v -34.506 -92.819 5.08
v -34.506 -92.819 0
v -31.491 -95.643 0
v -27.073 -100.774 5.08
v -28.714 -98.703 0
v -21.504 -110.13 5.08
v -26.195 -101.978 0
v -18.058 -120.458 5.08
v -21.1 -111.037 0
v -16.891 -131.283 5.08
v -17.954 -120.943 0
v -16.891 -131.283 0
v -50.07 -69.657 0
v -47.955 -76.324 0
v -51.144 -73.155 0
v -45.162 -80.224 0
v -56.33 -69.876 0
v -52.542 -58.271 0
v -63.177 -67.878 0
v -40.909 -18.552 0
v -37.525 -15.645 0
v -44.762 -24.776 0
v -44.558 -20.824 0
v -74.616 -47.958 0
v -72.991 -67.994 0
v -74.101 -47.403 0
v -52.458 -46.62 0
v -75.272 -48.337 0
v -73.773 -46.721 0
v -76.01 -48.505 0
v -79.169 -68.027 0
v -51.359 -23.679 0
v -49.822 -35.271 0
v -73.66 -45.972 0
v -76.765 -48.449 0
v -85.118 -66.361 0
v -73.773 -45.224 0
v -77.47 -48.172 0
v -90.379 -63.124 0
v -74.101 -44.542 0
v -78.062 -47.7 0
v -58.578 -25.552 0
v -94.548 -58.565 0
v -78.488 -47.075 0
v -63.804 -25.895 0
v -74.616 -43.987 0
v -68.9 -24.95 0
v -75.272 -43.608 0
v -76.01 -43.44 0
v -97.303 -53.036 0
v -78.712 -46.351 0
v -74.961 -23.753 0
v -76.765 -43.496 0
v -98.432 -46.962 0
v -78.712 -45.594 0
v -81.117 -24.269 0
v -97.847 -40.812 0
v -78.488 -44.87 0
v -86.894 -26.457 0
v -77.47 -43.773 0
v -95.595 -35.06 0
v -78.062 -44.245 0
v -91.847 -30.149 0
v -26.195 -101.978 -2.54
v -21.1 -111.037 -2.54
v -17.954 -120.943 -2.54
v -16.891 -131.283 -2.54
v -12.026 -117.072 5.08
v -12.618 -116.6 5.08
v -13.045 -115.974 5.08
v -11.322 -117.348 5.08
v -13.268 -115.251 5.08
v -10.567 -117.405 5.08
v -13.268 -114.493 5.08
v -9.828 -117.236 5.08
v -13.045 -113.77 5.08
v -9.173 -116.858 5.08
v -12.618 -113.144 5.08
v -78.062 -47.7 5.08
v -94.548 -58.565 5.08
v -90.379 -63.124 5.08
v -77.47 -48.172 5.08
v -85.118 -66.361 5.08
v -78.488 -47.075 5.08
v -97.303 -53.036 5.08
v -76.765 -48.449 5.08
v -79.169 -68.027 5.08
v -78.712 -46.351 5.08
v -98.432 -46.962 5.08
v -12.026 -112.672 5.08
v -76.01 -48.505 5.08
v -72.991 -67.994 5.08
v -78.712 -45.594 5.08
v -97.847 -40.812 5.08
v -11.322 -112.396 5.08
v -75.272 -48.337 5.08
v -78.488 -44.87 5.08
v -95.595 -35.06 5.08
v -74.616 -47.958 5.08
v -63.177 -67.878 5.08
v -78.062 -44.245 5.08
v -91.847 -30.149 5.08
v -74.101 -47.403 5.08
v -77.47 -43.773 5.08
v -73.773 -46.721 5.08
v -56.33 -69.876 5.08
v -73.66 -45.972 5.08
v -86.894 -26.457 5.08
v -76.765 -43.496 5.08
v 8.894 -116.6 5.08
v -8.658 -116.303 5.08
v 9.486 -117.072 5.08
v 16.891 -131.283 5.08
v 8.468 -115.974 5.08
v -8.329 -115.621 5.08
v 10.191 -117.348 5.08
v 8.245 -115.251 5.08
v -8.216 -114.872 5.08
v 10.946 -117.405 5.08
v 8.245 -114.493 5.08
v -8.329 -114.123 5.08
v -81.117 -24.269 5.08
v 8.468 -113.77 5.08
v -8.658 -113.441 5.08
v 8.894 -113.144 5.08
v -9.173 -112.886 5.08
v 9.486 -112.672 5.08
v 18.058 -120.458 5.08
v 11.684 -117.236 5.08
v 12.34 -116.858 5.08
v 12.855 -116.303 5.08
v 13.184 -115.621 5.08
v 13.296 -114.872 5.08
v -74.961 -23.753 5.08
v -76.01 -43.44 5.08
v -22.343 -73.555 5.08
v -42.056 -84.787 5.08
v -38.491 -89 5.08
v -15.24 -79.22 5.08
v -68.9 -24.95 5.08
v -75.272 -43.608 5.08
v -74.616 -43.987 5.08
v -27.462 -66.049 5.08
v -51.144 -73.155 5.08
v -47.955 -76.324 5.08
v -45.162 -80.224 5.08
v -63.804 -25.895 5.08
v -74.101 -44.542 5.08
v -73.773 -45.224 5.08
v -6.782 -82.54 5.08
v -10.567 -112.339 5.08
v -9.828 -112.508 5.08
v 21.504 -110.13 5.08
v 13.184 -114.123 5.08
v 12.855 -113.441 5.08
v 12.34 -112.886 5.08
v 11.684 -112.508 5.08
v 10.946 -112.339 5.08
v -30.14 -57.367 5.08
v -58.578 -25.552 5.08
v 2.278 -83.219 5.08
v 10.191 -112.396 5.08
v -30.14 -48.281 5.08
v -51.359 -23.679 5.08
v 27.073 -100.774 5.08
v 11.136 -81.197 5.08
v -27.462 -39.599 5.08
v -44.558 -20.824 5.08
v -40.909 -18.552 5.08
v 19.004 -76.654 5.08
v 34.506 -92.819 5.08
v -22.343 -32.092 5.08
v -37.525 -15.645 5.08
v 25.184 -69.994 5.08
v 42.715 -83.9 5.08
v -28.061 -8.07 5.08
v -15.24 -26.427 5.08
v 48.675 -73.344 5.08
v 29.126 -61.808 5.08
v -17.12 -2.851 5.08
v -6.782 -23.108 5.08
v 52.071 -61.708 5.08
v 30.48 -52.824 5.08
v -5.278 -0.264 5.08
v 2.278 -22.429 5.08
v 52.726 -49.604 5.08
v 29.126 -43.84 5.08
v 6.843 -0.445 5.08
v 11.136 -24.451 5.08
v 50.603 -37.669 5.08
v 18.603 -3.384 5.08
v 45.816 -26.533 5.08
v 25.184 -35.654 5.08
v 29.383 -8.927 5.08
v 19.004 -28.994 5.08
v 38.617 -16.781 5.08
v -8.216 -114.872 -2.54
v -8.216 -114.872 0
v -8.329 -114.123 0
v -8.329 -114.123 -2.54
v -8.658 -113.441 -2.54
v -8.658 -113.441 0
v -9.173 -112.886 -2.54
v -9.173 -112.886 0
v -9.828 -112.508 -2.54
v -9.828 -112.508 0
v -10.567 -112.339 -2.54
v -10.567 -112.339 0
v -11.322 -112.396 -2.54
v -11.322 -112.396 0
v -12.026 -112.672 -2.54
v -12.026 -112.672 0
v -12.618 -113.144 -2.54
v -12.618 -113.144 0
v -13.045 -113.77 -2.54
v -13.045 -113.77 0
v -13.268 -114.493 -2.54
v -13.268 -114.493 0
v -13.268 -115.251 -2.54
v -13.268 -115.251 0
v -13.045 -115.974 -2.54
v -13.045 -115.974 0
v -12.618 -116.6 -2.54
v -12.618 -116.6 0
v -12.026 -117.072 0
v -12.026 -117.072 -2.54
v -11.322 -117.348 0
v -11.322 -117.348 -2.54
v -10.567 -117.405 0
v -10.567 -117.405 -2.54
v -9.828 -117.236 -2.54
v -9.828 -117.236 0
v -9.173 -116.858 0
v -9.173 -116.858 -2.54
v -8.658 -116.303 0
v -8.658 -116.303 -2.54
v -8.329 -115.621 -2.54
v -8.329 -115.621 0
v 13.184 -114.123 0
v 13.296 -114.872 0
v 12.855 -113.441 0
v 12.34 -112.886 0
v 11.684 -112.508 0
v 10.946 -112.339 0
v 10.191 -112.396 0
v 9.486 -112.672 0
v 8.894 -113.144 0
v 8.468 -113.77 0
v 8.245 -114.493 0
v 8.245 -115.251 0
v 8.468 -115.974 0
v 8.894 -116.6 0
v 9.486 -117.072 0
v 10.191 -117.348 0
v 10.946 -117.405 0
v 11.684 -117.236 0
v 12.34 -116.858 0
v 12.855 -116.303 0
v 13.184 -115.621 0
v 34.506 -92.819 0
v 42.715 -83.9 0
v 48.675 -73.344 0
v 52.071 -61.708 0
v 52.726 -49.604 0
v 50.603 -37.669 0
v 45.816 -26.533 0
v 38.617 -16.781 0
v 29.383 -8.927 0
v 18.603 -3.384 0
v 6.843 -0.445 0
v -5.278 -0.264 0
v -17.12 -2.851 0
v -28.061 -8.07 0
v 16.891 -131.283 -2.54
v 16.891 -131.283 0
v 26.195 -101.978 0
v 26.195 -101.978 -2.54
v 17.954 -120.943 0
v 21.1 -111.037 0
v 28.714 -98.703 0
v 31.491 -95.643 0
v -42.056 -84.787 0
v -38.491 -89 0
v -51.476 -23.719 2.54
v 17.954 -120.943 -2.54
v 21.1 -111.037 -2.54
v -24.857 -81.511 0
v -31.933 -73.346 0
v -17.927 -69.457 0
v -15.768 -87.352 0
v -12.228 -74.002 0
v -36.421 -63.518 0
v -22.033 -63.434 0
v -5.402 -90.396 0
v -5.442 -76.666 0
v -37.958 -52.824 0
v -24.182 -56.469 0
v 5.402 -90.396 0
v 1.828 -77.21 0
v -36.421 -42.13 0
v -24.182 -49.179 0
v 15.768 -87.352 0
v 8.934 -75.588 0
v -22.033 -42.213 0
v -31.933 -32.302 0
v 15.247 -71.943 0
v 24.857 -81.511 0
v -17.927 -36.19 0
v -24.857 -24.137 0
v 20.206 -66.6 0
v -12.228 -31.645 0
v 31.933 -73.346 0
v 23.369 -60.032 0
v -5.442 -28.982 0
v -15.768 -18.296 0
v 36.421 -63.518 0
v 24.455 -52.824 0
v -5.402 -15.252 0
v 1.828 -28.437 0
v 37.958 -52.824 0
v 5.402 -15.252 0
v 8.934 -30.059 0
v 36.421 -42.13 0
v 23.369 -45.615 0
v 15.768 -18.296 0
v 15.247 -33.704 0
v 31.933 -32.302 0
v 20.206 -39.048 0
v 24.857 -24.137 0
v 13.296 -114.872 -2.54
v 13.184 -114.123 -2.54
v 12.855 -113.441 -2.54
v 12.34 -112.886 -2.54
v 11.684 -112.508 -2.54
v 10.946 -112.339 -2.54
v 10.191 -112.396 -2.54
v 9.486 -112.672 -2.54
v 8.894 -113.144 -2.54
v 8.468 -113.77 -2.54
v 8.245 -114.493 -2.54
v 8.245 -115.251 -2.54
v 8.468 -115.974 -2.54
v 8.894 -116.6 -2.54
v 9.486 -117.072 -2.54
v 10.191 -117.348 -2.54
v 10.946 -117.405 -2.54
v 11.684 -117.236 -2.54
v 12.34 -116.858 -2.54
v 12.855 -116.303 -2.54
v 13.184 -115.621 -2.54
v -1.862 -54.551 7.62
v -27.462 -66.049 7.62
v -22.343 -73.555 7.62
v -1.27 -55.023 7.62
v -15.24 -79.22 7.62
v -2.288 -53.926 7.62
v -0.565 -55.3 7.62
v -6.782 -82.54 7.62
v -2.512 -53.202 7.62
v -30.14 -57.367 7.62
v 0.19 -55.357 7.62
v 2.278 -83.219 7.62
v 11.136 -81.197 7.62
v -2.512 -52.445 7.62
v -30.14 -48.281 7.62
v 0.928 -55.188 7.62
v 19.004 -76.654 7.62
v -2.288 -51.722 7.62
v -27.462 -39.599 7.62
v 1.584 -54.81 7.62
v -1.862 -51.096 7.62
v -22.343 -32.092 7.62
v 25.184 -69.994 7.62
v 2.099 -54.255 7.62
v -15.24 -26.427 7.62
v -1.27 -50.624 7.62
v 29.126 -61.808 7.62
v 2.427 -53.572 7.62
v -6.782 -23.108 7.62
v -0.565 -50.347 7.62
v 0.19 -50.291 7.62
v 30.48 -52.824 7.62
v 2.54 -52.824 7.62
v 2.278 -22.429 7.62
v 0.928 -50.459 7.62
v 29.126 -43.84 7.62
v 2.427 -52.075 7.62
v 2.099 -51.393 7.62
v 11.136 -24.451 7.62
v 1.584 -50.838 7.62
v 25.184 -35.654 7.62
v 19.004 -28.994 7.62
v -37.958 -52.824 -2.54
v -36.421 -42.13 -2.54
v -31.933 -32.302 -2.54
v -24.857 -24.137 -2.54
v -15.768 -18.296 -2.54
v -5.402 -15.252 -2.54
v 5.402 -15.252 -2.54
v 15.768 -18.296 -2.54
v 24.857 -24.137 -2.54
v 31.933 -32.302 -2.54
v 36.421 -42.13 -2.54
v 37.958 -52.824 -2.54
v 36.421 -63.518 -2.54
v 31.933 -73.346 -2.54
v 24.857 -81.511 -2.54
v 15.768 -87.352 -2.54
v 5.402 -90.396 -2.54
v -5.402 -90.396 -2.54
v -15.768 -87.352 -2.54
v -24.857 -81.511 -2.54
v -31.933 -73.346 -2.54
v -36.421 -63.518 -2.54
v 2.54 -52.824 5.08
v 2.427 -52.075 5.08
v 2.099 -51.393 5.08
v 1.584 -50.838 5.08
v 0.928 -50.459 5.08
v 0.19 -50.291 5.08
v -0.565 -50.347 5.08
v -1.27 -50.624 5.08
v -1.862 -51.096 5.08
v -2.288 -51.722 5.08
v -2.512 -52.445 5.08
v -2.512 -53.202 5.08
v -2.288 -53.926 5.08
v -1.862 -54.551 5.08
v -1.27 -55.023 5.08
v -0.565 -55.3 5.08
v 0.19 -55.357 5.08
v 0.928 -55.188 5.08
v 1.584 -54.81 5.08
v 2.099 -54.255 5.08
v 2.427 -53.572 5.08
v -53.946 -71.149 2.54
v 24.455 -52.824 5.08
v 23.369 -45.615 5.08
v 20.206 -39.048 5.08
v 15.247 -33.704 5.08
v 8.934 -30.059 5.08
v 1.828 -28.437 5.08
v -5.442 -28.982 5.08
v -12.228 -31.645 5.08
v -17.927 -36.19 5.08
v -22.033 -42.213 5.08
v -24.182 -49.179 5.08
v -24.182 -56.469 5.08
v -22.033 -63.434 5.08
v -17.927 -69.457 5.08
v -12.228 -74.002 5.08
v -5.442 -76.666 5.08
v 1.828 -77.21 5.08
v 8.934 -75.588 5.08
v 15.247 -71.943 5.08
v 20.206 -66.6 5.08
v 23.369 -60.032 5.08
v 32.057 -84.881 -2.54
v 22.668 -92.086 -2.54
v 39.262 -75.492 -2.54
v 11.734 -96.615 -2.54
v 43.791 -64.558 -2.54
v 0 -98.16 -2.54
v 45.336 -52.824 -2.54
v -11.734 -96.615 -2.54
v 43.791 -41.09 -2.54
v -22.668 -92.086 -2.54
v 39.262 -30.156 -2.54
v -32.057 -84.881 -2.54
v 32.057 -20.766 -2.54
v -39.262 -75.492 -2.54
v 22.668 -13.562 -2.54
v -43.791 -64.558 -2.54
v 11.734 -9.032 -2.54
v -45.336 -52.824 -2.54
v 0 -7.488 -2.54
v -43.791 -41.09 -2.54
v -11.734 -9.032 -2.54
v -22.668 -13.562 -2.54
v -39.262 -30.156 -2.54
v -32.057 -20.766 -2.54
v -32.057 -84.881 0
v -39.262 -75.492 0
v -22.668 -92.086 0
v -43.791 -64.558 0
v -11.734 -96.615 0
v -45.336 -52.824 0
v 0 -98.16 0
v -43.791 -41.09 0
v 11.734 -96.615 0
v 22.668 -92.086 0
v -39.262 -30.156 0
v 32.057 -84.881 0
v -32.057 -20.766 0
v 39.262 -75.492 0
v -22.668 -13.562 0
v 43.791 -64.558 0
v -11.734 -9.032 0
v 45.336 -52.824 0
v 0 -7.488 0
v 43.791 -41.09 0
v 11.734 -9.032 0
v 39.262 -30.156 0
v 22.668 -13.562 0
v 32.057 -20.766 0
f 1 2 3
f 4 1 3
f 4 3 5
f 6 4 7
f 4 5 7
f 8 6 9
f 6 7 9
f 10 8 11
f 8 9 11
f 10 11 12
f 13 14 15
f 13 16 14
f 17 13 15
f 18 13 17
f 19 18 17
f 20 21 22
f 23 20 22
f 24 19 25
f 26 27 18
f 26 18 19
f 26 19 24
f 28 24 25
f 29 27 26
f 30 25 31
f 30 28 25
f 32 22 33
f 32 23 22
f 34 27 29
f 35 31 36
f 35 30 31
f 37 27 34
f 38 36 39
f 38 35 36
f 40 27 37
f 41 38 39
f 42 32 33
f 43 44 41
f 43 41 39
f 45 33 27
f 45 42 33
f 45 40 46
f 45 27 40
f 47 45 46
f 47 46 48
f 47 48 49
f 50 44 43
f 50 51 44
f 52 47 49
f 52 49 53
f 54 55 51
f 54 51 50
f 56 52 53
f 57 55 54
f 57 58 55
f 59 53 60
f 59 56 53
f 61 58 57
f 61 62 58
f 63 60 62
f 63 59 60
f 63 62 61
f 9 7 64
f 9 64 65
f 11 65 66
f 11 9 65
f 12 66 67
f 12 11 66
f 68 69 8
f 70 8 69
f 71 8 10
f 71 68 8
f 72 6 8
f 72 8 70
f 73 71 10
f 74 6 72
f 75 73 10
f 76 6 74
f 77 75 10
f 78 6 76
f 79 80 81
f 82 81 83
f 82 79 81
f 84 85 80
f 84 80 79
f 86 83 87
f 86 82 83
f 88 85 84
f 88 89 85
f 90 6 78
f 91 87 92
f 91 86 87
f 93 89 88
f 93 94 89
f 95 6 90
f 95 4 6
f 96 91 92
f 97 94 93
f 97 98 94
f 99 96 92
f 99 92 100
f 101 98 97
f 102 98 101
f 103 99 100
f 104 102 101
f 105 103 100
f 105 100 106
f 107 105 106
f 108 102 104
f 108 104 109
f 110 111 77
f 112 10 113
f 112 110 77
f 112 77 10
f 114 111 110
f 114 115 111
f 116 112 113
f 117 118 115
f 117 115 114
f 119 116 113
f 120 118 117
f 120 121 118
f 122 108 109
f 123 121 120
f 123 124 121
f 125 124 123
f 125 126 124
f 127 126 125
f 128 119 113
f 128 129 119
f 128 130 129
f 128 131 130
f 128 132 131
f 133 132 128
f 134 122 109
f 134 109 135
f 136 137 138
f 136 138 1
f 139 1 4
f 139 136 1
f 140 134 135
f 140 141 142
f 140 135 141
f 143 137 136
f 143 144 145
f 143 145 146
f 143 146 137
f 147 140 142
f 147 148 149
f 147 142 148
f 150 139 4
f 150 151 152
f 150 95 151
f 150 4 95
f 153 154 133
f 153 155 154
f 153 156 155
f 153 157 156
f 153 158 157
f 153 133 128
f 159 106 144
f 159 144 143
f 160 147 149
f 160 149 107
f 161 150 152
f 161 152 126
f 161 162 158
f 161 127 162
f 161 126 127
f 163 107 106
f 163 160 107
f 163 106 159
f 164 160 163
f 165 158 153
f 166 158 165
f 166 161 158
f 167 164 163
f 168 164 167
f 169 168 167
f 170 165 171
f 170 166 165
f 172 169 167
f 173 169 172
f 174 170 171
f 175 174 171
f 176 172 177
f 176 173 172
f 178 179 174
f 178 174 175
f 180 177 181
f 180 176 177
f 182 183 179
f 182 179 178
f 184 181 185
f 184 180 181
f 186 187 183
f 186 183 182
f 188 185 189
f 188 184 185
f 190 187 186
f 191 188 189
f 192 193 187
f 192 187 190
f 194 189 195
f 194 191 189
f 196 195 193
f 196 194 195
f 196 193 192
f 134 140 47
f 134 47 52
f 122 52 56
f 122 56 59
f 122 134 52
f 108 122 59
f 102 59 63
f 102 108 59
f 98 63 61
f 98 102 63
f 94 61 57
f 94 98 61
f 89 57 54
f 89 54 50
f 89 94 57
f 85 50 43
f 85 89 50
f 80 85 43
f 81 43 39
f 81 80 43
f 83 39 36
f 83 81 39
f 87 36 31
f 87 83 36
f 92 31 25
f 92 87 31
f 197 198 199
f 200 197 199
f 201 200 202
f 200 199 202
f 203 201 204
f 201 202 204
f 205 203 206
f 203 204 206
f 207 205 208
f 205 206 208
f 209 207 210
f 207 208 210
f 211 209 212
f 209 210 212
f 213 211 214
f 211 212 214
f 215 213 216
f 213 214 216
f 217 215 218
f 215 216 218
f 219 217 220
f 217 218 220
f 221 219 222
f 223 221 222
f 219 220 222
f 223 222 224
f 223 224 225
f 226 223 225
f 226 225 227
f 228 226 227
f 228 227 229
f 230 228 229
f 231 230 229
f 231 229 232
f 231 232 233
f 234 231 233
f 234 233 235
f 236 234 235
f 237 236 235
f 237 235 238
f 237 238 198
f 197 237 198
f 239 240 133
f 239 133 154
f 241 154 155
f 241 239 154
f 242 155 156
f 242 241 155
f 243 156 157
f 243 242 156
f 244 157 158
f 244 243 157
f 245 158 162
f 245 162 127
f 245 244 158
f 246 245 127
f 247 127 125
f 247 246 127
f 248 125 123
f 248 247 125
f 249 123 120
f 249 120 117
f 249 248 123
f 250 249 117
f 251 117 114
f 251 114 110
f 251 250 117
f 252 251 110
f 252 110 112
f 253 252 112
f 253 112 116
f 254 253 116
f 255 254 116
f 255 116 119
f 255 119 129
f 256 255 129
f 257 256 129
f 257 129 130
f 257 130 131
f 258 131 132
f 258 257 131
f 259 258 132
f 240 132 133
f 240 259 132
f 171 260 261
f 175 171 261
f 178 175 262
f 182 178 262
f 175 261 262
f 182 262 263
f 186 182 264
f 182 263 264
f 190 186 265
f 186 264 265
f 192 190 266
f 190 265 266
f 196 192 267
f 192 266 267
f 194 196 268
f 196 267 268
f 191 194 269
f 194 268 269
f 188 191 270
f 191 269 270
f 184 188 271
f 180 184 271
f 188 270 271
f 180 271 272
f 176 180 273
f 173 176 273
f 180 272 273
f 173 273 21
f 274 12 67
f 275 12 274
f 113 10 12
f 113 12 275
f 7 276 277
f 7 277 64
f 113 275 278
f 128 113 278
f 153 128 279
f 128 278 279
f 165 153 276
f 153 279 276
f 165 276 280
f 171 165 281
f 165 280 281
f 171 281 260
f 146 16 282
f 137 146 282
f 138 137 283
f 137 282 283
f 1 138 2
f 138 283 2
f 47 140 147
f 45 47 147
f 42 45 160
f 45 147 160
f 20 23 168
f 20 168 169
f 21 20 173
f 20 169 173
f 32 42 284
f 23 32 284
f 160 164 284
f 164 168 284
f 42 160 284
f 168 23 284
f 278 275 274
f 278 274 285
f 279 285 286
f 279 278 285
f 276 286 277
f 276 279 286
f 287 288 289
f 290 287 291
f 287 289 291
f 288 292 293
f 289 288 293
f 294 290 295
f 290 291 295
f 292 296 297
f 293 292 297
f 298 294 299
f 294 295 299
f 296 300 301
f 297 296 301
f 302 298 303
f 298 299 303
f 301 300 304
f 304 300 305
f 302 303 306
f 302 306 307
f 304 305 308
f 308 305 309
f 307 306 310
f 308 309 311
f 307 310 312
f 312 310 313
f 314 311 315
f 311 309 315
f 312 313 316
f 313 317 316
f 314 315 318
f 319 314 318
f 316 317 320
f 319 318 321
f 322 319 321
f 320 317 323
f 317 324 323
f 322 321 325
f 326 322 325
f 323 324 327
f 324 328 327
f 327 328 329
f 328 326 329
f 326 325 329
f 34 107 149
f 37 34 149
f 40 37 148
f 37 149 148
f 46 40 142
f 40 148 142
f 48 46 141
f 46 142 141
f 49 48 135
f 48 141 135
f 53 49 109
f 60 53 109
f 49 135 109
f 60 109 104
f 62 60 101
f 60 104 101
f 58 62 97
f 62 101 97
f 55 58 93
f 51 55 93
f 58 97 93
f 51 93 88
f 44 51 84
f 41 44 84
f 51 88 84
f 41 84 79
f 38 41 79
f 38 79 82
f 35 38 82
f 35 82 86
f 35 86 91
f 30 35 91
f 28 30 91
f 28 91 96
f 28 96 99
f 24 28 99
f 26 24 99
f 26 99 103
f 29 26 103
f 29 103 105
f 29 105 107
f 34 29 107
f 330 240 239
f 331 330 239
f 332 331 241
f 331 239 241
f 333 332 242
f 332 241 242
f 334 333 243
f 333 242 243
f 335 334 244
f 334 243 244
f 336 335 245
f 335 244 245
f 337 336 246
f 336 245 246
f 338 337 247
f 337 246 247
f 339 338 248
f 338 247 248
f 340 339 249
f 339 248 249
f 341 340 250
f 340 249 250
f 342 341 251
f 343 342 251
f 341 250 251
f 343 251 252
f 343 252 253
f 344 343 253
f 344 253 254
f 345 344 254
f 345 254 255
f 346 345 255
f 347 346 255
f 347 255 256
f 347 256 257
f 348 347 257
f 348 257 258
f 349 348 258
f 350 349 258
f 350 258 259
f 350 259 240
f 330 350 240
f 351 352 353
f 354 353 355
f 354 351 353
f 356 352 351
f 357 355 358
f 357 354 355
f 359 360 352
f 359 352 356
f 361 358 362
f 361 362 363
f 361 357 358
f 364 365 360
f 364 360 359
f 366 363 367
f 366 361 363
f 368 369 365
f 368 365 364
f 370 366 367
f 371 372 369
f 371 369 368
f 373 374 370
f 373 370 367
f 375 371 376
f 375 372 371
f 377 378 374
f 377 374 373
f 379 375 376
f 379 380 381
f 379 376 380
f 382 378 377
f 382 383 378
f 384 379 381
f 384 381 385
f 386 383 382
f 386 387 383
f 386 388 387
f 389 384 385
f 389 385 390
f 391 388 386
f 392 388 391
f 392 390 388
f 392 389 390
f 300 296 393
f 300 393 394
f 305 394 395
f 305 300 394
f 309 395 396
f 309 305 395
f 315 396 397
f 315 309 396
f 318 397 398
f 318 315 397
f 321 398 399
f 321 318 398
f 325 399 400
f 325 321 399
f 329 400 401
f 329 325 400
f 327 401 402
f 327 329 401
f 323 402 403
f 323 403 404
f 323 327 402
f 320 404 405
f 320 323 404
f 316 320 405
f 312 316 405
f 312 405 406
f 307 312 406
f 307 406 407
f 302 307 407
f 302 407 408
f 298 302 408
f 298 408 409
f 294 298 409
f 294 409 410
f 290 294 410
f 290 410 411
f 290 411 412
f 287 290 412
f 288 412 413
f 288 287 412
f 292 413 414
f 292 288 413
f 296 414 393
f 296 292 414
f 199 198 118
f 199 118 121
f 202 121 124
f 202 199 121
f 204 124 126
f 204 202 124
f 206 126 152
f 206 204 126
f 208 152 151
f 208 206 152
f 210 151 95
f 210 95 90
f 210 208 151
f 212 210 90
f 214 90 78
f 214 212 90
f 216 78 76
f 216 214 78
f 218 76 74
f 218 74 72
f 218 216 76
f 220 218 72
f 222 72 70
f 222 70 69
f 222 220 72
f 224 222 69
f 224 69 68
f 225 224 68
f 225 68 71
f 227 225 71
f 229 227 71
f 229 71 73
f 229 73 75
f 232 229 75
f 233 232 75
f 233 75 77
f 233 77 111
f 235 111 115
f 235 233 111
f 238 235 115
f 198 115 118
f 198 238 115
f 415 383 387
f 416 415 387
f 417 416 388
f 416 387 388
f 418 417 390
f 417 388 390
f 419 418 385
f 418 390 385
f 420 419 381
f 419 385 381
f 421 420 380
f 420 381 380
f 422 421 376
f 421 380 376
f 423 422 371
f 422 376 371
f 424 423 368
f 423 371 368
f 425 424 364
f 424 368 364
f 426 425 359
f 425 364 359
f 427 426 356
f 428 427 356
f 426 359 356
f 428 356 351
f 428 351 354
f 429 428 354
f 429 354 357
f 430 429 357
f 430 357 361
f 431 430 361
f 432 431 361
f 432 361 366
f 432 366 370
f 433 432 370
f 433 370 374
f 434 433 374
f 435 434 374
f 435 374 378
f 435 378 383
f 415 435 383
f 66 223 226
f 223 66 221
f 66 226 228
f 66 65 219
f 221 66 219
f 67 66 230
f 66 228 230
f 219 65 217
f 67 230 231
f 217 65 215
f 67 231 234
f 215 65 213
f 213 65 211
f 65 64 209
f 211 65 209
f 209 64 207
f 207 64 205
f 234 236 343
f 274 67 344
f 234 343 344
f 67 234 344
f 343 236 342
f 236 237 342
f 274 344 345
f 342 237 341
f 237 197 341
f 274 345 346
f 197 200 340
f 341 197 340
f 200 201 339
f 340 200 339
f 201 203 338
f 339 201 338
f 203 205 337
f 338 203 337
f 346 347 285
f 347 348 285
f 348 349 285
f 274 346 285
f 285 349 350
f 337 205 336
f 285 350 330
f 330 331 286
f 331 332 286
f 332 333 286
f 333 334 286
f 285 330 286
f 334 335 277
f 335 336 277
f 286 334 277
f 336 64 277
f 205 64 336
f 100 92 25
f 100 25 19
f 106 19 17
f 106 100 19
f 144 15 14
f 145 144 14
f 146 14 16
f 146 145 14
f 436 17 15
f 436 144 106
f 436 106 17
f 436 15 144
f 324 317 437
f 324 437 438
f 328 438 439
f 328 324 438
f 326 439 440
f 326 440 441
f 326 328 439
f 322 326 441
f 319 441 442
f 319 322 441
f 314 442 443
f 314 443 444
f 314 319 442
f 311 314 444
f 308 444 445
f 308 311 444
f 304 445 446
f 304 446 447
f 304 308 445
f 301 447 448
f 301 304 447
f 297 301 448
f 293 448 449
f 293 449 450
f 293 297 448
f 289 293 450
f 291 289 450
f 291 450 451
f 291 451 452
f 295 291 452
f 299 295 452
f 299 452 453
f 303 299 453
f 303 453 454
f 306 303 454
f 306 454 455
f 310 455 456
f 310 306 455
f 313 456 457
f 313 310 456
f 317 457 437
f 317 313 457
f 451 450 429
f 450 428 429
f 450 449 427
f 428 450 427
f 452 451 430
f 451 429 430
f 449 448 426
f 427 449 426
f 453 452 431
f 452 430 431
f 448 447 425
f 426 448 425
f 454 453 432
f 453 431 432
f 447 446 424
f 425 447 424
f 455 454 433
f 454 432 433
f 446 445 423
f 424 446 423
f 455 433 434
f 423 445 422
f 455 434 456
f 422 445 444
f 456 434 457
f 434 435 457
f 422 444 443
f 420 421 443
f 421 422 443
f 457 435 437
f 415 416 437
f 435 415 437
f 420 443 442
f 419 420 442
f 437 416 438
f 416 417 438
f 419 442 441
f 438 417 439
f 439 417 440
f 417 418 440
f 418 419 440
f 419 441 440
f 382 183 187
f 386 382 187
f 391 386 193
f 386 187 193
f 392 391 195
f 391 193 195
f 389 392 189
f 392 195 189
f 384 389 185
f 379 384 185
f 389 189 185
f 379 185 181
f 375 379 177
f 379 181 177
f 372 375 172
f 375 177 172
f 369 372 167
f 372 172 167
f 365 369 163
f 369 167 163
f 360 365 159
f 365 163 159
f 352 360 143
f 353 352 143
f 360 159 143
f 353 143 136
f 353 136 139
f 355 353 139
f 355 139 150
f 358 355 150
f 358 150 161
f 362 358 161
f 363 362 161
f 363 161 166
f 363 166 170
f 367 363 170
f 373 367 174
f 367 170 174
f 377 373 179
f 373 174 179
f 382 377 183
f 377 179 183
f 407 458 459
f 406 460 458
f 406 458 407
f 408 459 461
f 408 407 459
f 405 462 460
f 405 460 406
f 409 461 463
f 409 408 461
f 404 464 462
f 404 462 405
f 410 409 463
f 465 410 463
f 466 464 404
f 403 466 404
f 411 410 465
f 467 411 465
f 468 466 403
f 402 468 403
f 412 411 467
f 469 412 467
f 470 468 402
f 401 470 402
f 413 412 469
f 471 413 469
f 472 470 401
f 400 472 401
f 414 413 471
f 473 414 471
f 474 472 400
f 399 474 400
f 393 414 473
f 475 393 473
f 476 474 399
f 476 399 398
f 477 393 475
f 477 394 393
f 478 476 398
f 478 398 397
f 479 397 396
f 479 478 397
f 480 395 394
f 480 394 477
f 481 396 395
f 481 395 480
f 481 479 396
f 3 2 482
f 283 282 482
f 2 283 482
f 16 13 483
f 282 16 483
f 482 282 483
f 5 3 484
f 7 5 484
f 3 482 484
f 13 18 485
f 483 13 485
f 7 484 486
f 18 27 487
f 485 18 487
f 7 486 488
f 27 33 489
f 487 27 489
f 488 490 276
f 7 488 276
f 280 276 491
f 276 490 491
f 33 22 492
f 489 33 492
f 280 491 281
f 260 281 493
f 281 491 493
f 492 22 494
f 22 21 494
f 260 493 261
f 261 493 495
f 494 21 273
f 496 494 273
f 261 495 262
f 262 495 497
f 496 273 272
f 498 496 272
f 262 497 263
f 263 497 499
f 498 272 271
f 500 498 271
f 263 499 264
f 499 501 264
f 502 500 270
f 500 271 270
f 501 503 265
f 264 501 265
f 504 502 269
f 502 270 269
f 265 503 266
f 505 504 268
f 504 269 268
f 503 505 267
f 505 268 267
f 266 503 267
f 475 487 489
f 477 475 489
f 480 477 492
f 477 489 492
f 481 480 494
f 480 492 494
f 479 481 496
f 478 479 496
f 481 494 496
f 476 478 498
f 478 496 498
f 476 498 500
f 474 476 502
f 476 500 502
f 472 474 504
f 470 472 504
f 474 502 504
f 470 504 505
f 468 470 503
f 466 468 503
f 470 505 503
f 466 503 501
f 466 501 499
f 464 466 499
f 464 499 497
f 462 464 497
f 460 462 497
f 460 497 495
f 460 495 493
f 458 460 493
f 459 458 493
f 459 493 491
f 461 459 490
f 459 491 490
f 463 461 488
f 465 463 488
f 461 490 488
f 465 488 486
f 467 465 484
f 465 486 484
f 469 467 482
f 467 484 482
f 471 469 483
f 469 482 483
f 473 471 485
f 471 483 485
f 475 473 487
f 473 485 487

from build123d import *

# Parameters (mm, degrees)
SKETCH1_R           = 24.455055929
SKETCH1_R_2         = 2.54
BOSS_EXTRUDE1_DEPTH = 5.08
SKETCH4_R           = 30.48
BOSS_EXTRUDE3_DEPTH = 2.54
SKETCH5_R           = 2.54
CUT_EXTRUDE2_DEPTH  = 8.62
SKETCH6_R           = 45.336039437
SKETCH6_R_2         = 37.958395775
BOSS_EXTRUDE4_DEPTH = 2.54
SKETCH7_R           = 2.54
CUT_EXTRUDE3_DEPTH  = 3.54
BOSS_EXTRUDE6_DEPTH = 5.08
SKETCH11_R          = 2.54
CUT_EXTRUDE4_DEPTH  = 8.62


with BuildPart() as part:
    # Sketch1 → Boss-Extrude1 (new body)
    with BuildSketch(Plane.XY):
        with BuildLine():
            Line((-16.891, -131.282672274), (16.891, -131.282672274))
            ThreePointArc((16.891, -131.282672274), (21.504350582, -110.13005032), (34.5064888, -92.819336271))
            ThreePointArc((34.5064888, -92.819336271), (0, 0), (-34.5064888, -92.819336271))
            ThreePointArc((-34.5064888, -92.819336271), (-21.504350582, -110.13005032), (-16.891, -131.282672274))
        make_face()
        with Locations((0, -52.823729134)):
            Circle(SKETCH1_R, mode=Mode.SUBTRACT)
        with Locations((-10.756405179, -114.872047193)):
            Circle(SKETCH1_R_2, mode=Mode.SUBTRACT)
        with Locations((10.756405179, -114.872047193)):
            Circle(SKETCH1_R_2, mode=Mode.SUBTRACT)
    extrude(amount=BOSS_EXTRUDE1_DEPTH)

    # Sketch4 → Boss-Extrude3 (add)
    with BuildSketch(Plane.XY.offset(5.08)):
        with Locations((0, -52.823729134)):
            Circle(SKETCH4_R)
    extrude(amount=BOSS_EXTRUDE3_DEPTH)

    # Sketch5 → Cut-Extrude2 (cut, through all)
    with BuildSketch(Plane.XY.offset(7.62)):
        with Locations((0, -52.823729134)):
            Circle(SKETCH5_R)
    extrude(amount=-CUT_EXTRUDE2_DEPTH, mode=Mode.SUBTRACT)

    # Sketch6 → Boss-Extrude4 (add)
    with BuildSketch(Plane(origin=(0, 0, 0), x_dir=(-1, 0, 0), z_dir=(0, 0, -1))):
        with Locations((0, -52.823729134)):
            Circle(SKETCH6_R)
        with Locations((0, -52.823729134)):
            Circle(SKETCH6_R_2, mode=Mode.SUBTRACT)
        with BuildLine():
            Line((16.891, -131.282672274), (-16.891, -131.282672274))
            ThreePointArc((-16.891, -131.282672274), (-19.272918471, -115.909664076), (-26.19530634, -101.978279981))
            Line((-26.19530634, -101.978279981), (26.19530634, -101.978279981))
            ThreePointArc((26.19530634, -101.978279981), (19.272918471, -115.909664076), (16.891, -131.282672274))
        make_face()
    extrude(amount=BOSS_EXTRUDE4_DEPTH)

    # Sketch7 → Cut-Extrude3 (cut, through all)
    with BuildSketch(Plane.XY):
        with Locations((-10.756405179, -114.872047193)):
            Circle(SKETCH7_R)
        with Locations((10.756405179, -114.872047193)):
            Circle(SKETCH7_R)
    extrude(amount=-CUT_EXTRUDE3_DEPTH, mode=Mode.SUBTRACT)

    # Sketch10 → Boss-Extrude6 (add)
    with BuildSketch(Plane.XY.offset(5.08)):
        with BuildLine():
            add(Edge.make_bspline(
                [(-68.900180003, -24.949874899), (-63.297197231, -26.895437115), (-51.389708048, -24.415182371), (-41.569282444, -19.727412804), (-37.524583334, -15.645079276)],
                knots=[0, 0, 0, 0, 0.520070067, 1, 1, 1, 1], degree=3))
            ThreePointArc((-68.900180003, -24.949874899), (-98.354072, -43.866775297), (-72.9914133, -67.993864183))
            add(Edge.make_bspline(
                [(-72.9914133, -67.993864183), (-65.508215076, -66.903538588), (-55.033388576, -68.640688731), (-47.574313167, -76.247284621), (-45.161811227, -80.223677424)],
                knots=[0, 0, 0, 0, 0.604504859, 1, 1, 1, 1], degree=3))
            ThreePointArc((-45.161811227, -80.223677424), (-52.45816234, -46.619894549), (-37.524583334, -15.645079276))
        make_face()
    extrude(amount=-BOSS_EXTRUDE6_DEPTH)

    # Sketch11 → Cut-Extrude4 (cut, through all)
    with BuildSketch(Plane.XY.offset(5.08)):
        with Locations((-76.2, -45.972469461)):
            Circle(SKETCH11_R)
    extrude(amount=-CUT_EXTRUDE4_DEPTH, mode=Mode.SUBTRACT)


solid = part.part
